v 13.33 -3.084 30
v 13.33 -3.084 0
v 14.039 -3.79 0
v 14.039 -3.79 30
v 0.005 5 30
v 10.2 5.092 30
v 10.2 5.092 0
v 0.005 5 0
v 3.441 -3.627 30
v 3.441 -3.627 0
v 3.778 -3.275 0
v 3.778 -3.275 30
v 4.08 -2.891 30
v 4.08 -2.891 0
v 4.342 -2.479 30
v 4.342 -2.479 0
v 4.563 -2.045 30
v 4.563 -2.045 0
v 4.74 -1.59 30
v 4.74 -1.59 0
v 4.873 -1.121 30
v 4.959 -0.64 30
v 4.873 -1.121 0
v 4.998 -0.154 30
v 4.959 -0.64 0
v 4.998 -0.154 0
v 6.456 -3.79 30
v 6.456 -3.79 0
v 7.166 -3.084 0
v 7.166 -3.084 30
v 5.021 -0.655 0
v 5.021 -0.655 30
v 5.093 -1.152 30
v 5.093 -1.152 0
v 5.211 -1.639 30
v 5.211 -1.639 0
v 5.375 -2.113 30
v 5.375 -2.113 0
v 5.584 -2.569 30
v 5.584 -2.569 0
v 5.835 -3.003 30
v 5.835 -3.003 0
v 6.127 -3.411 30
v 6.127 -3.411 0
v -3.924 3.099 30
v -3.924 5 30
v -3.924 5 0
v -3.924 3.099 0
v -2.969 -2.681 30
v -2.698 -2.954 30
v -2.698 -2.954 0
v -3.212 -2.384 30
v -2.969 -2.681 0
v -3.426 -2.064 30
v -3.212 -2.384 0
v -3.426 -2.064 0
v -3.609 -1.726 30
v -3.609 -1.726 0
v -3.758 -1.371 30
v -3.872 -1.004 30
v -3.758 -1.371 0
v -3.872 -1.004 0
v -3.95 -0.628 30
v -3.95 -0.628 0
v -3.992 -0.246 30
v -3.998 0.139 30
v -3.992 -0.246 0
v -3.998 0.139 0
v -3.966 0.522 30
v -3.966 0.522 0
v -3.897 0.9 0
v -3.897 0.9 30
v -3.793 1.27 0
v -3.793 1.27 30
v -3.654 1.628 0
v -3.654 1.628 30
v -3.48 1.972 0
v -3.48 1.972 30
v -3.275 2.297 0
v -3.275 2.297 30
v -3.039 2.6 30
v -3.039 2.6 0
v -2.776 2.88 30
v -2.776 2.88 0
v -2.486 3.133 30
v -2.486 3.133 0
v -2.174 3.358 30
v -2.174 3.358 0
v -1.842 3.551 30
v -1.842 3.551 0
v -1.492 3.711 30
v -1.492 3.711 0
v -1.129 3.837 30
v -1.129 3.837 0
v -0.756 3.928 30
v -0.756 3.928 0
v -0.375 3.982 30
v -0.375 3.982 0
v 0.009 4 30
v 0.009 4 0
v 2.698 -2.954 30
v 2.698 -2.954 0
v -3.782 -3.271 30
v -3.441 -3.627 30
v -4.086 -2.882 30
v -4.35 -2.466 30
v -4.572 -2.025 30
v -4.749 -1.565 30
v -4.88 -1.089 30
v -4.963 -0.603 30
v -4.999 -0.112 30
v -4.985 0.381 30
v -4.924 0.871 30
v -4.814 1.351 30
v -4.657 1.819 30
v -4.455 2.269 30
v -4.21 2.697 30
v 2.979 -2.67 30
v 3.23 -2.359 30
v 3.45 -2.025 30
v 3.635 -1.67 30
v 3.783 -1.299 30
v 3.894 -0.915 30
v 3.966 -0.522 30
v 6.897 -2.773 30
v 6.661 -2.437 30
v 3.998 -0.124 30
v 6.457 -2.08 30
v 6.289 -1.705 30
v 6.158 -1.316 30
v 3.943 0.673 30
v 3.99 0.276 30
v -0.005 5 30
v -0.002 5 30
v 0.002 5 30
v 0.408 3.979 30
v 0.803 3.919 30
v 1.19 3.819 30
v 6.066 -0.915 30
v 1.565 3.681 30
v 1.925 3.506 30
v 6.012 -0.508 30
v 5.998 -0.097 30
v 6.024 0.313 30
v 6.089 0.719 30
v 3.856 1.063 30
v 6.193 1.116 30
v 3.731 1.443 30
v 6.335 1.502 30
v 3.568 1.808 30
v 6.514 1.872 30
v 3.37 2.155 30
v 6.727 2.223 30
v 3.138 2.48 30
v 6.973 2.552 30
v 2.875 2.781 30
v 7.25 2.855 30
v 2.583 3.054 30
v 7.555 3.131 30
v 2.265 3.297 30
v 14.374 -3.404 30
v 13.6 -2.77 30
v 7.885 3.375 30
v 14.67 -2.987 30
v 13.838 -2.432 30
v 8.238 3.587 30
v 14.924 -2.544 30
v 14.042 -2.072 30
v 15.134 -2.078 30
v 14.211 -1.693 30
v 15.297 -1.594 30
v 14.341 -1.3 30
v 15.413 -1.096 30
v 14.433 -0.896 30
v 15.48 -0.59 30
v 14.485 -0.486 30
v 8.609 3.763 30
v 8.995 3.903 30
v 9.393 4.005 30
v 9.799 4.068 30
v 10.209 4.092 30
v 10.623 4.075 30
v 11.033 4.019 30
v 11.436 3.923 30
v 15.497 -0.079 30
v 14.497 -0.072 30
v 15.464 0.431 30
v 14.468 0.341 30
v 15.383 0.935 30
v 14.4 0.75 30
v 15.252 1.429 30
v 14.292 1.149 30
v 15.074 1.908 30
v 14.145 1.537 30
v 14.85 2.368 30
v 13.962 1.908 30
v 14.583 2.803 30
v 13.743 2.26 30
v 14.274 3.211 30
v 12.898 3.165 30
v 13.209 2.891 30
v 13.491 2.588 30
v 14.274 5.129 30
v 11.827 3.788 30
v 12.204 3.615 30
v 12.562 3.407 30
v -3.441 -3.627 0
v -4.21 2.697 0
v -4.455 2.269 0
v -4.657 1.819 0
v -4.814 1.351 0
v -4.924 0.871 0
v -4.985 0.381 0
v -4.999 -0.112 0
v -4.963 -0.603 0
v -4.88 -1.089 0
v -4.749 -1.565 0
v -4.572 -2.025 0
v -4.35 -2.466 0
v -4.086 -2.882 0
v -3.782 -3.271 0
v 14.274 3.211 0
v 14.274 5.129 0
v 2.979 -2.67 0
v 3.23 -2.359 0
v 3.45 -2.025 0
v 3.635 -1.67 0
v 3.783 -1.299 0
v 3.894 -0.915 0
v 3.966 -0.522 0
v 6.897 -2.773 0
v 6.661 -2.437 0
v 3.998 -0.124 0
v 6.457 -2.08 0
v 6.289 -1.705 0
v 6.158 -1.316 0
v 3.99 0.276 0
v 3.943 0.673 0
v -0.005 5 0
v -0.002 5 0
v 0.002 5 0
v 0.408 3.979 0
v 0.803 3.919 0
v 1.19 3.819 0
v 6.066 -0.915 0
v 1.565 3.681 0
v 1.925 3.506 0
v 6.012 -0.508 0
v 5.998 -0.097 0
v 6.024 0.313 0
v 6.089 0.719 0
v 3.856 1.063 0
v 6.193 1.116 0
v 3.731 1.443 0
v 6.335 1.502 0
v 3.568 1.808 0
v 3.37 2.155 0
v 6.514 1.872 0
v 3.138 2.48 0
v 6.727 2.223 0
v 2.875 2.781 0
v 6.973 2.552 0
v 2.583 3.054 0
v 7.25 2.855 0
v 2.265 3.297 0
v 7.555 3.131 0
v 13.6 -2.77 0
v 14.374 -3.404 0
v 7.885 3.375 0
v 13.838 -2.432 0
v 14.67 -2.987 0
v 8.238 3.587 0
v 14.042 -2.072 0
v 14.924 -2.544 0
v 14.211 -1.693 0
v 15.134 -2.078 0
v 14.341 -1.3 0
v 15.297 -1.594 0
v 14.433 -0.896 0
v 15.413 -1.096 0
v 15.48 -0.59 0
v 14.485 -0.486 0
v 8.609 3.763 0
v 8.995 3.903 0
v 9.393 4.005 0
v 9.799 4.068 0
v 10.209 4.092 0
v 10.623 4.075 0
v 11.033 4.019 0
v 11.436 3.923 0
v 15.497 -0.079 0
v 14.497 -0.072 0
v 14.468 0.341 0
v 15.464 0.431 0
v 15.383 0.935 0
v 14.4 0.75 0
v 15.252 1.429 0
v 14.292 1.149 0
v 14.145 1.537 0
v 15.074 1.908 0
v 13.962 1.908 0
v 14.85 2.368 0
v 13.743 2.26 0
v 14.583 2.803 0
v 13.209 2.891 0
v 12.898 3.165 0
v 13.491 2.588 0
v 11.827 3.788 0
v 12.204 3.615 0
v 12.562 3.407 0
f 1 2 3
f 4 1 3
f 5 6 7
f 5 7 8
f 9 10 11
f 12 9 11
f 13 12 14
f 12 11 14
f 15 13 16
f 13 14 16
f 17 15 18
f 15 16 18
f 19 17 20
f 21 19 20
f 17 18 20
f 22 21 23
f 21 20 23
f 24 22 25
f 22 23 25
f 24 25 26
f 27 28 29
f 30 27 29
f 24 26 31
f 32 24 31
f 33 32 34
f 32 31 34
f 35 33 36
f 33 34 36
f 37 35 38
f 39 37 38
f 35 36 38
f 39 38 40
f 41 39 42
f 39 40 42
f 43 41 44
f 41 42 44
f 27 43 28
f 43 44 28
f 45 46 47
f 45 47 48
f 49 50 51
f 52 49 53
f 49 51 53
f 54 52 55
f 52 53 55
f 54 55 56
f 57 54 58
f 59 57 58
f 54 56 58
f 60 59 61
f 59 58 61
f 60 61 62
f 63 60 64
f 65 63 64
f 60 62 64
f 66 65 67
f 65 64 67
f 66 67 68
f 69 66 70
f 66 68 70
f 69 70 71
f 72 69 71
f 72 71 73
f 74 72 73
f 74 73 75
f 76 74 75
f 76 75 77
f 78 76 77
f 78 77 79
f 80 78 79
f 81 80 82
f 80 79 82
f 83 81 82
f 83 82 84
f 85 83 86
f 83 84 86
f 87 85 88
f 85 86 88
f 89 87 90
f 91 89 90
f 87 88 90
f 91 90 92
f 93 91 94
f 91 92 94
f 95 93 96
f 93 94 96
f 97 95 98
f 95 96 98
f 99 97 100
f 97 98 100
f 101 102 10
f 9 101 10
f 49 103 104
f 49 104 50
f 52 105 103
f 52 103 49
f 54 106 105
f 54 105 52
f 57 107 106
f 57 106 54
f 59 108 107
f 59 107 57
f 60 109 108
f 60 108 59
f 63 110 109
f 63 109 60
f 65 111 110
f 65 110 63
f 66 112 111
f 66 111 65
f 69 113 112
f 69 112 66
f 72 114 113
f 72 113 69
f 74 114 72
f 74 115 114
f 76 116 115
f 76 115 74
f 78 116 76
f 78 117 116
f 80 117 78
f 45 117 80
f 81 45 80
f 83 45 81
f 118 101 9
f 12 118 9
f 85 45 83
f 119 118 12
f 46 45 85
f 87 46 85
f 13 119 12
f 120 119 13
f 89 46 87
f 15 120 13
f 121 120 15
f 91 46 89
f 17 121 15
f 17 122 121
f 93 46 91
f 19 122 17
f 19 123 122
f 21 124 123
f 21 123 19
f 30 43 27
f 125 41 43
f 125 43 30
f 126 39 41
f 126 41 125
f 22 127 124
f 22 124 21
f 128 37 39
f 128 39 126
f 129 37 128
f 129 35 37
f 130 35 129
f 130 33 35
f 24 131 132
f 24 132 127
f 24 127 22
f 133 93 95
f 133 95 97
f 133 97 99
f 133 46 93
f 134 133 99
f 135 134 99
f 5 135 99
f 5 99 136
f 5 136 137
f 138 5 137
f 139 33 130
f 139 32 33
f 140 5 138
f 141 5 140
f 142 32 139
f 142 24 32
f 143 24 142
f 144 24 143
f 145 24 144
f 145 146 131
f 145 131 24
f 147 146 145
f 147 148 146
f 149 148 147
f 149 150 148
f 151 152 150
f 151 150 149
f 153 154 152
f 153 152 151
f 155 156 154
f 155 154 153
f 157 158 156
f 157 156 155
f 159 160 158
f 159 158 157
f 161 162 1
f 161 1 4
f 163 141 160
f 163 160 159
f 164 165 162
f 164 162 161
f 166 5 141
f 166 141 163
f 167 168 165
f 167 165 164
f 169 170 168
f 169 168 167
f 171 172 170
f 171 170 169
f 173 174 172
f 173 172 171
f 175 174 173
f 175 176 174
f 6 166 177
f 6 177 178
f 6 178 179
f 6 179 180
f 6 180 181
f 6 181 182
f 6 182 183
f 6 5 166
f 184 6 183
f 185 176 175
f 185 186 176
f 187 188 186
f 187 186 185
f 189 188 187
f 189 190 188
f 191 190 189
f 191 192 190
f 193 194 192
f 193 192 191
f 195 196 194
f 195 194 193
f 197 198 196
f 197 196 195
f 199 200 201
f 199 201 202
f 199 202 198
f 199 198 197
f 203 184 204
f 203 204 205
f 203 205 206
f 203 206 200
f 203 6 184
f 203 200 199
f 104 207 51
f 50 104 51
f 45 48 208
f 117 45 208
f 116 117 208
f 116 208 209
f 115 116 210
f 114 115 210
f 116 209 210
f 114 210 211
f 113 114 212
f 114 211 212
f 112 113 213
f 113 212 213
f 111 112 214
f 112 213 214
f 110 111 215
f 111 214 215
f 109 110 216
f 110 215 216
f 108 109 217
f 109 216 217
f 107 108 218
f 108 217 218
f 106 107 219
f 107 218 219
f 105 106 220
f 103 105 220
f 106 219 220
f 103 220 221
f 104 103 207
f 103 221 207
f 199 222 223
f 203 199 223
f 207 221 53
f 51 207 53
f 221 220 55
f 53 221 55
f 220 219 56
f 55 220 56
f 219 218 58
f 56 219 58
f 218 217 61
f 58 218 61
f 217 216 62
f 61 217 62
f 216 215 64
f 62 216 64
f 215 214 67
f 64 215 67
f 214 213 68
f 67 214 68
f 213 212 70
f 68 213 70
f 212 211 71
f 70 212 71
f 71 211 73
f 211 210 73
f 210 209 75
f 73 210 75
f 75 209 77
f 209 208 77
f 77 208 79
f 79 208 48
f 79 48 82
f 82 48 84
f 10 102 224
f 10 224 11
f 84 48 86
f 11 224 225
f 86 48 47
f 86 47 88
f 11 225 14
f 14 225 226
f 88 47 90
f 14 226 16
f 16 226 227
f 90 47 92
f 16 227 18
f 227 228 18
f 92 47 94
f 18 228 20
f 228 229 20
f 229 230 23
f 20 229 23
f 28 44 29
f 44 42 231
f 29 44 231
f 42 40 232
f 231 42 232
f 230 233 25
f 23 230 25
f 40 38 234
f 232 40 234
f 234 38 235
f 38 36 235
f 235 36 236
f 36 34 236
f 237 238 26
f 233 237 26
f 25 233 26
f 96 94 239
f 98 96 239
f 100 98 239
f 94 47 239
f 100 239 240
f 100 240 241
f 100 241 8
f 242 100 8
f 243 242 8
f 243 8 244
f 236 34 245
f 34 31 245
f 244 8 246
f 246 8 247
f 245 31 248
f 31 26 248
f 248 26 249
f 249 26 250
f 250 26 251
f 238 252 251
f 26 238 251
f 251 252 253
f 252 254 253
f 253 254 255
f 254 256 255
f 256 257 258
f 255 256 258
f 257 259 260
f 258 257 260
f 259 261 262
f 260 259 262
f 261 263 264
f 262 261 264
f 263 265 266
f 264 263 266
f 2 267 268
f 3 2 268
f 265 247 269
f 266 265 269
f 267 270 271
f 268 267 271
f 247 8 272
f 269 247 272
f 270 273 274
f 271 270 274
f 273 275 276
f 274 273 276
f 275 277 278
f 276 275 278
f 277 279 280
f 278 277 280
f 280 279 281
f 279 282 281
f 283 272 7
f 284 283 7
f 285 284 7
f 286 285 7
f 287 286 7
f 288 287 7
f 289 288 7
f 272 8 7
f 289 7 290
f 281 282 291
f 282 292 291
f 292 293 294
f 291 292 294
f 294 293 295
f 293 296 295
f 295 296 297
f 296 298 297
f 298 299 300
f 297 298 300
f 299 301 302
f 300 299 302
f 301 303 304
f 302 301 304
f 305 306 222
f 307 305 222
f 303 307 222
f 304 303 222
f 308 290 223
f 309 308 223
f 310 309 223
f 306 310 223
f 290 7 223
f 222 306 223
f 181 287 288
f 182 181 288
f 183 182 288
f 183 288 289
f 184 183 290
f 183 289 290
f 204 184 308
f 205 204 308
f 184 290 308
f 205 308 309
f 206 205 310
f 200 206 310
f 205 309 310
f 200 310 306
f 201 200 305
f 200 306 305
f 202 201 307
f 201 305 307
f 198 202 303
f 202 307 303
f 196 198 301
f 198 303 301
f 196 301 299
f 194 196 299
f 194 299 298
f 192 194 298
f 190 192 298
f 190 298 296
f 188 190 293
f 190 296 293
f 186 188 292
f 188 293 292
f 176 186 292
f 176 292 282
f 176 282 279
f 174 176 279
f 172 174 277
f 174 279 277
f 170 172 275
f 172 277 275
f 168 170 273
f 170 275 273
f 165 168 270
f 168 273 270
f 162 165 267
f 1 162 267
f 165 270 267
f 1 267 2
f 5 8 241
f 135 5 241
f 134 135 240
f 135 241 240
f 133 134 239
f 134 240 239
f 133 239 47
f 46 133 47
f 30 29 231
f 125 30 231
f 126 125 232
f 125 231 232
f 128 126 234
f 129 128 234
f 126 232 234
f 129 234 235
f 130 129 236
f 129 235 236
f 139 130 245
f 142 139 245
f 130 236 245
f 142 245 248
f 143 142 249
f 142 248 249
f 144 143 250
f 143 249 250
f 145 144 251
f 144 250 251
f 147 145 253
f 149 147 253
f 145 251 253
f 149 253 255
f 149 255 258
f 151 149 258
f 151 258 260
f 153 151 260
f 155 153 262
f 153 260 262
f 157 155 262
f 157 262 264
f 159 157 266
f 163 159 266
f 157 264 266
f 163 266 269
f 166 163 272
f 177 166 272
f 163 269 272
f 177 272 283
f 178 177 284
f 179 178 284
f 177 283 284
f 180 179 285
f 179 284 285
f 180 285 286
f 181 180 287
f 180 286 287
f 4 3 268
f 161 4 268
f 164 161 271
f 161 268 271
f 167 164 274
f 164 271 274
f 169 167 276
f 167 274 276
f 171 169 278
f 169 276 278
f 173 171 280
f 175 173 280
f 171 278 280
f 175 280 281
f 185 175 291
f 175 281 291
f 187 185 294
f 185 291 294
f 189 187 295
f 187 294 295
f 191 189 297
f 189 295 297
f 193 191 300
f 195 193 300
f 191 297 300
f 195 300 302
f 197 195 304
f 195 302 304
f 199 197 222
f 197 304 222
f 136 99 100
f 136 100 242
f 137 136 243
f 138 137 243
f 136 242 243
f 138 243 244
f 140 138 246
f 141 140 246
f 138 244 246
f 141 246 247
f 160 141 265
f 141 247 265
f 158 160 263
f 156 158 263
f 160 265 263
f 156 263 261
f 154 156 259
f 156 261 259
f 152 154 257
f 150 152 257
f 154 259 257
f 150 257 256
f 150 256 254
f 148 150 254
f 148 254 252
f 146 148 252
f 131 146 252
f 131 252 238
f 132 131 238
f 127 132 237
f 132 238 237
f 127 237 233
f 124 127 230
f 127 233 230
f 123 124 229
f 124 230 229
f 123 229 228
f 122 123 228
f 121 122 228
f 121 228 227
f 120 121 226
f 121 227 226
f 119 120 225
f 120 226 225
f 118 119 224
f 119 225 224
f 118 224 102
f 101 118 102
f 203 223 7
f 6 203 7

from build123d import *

# Parameters (mm, degrees)
F1_DEPTH    = 30
F2_T1_DEPTH = 30


# Not quite as in the source:
# - a fillet or chamfer that OpenCascade refuses, or shapes differently, is made with other operations: its cross-section is extruded or revolved along the edge and cut away or added
# - ends of sketch curves that miss each other by under 0.0002 mm in the source are joined
# - a feature names something its author has since deleted; it is built from what else it names


with BuildPart() as f1:
    # F0 (on Top) → F1 (new body)
    with BuildSketch(Plane.XY):
        with BuildLine():
            ThreePointArc((0.0090084839, 3.9999898559), (3.7308371777, 1.442516535), (2.6975556514, -2.9535052916))
            Line((2.6975556514, -2.9535052916), (3.4413844377, -3.6272404321))
            ThreePointArc((3.4413844377, -3.6272404321), (4.562894469, -2.0445033784), (4.9976265844, -0.1540406522))
            ThreePointArc((4.9976265844, -0.1540406522), (4.9982482299, -0.0770116198), (5, 0))
            ThreePointArc((5, 0), (4.4620948533, 2.2560384571), (2.964116192, 4.0266630354))
            Line((2.964116192, 4.0266630354), (0.0090084839, 3.9999898559))
        make_face()
        with BuildLine():
            ThreePointArc((-2.6975556514, -2.9535052916), (-3.7275789944, 1.4509151734), (0.0090084839, 3.9999898559))
            Line((0.0090084839, 3.9999898559), (2.964116192, 4.0266630354))
            ThreePointArc((2.964116192, 4.0266630354), (1.5599174374, 4.7504376207), (0, 5))
            ThreePointArc((0, 5), (-2.1802578035, 4.4996084175), (-3.9241225459, 3.0985903642))
            ThreePointArc((-3.9241225459, 3.0985903642), (-4.9871708669, -0.3579479625), (-3.4413844377, -3.6272404321))
            Line((-3.4413844377, -3.6272404321), (-2.6975556514, -2.9535052916))
        make_face()
        with BuildLine():
            ThreePointArc((0, 5), (1.5599174374, 4.7504376207), (2.964116192, 4.0266630354))
            Line((2.964116192, 4.0266630354), (7.1272566982, 4.0641686172))
            ThreePointArc((7.1272566982, 4.0641686172), (8.5825190892, 4.8210552933), (10.200330031, 5.0918944033))
            Line((10.200330031, 5.0918944033), (0, 5))
        make_face()
        with BuildLine():
            ThreePointArc((5, 0), (4.9982482299, -0.0770116198), (4.9976265844, -0.1540406522))
            ThreePointArc((4.9976265844, -0.1540406522), (4.9994066109, -0.0770294678), (5, 0))
        make_face()
        with BuildLine():
            ThreePointArc((5, 0), (4.9994066109, -0.0770294678), (4.9976265844, -0.1540406522))
            ThreePointArc((4.9976265844, -0.1540406522), (5.3752392401, -2.1129770441), (6.4564240892, -3.7895993711))
            Line((6.4564240892, -3.7895993711), (7.1655909773, -3.0842495499))
            ThreePointArc((7.1655909773, -3.0842495499), (6.3350165087, 1.5016234688), (10.2093385862, 4.0919349811))
            Line((10.2093385862, 4.0919349811), (7.1272566982, 4.0641686172))
            ThreePointArc((7.1272566982, 4.0641686172), (5.5962602055, 2.2767129418), (5, 0))
        make_face()
        with BuildLine():
            ThreePointArc((-3.9241225459, 3.0985903642), (-2.1802578035, 4.4996084175), (0, 5))
            Line((0, 5), (-3.9241225459, 5))
            Line((-3.9241225459, 5), (-3.9241225459, 3.0985903642))
        make_face()
        with BuildLine():
            ThreePointArc((10.200330031, 5.0918944033), (8.5825190892, 4.8210552933), (7.1272566982, 4.0641686172))
            Line((7.1272566982, 4.0641686172), (10.2093385862, 4.0919349811))
            Line((10.2093385862, 4.0919349811), (13.2914205601, 4.1197013458))
            ThreePointArc((13.2914205601, 4.1197013458), (11.8227579499, 4.8502464877), (10.200330031, 5.0918944033))
        make_face()
        with BuildLine():
            Line((14.2744146958, 5.1285976842), (10.200330031, 5.0918944033))
            ThreePointArc((10.200330031, 5.0918944033), (11.8227579499, 4.8502464877), (13.2914205601, 4.1197013458))
            ThreePointArc((13.2914205601, 4.1197013458), (13.8120129481, 3.6966683449), (14.2744146958, 3.2107074637))
            Line((14.2744146958, 3.2107074637), (14.2744146958, 5.1285976842))
        make_face()
        with BuildLine():
            Line((13.2914205601, 4.1197013458), (10.2093385862, 4.0919349811))
            ThreePointArc((10.2093385862, 4.0919349811), (14.145125137, 1.5368032872), (13.3296593654, -3.0842495499))
            Line((13.3296593654, -3.0842495499), (14.0388262535, -3.7895993711))
            ThreePointArc((14.0388262535, -3.7895993711), (15.4946546383, -0.3344761776), (14.2744146958, 3.2107074637))
            ThreePointArc((14.2744146958, 3.2107074637), (13.8120129481, 3.6966683449), (13.2914205601, 4.1197013458))
        make_face()
        with BuildLine():
            Line((7.1272566982, 4.0641686172), (2.964116192, 4.0266630354))
            ThreePointArc((2.964116192, 4.0266630354), (4.4620948533, 2.2560384571), (5, 0))
            ThreePointArc((5, 0), (5.5962602055, 2.2767129418), (7.1272566982, 4.0641686172))
        make_face()
    extrude(amount=F1_DEPTH)

    # F2: fillet of radius 1 on 1 edges, made by hand

    # F2_s2 → F2_t1 (join)
    with BuildSketch(Plane.XY):
        with BuildLine():
            ThreePointArc((0.0045042077, 5.0000405782), (-4.57e-08, 5.0000101446), (-0.0045043905, 5))
            Line((-0.0045043905, 5), (0, 5))
            Line((0, 5), (0.0045042077, 5.0000405782))
        make_face()
    extrude(amount=F2_T1_DEPTH)


solid = f1.part
